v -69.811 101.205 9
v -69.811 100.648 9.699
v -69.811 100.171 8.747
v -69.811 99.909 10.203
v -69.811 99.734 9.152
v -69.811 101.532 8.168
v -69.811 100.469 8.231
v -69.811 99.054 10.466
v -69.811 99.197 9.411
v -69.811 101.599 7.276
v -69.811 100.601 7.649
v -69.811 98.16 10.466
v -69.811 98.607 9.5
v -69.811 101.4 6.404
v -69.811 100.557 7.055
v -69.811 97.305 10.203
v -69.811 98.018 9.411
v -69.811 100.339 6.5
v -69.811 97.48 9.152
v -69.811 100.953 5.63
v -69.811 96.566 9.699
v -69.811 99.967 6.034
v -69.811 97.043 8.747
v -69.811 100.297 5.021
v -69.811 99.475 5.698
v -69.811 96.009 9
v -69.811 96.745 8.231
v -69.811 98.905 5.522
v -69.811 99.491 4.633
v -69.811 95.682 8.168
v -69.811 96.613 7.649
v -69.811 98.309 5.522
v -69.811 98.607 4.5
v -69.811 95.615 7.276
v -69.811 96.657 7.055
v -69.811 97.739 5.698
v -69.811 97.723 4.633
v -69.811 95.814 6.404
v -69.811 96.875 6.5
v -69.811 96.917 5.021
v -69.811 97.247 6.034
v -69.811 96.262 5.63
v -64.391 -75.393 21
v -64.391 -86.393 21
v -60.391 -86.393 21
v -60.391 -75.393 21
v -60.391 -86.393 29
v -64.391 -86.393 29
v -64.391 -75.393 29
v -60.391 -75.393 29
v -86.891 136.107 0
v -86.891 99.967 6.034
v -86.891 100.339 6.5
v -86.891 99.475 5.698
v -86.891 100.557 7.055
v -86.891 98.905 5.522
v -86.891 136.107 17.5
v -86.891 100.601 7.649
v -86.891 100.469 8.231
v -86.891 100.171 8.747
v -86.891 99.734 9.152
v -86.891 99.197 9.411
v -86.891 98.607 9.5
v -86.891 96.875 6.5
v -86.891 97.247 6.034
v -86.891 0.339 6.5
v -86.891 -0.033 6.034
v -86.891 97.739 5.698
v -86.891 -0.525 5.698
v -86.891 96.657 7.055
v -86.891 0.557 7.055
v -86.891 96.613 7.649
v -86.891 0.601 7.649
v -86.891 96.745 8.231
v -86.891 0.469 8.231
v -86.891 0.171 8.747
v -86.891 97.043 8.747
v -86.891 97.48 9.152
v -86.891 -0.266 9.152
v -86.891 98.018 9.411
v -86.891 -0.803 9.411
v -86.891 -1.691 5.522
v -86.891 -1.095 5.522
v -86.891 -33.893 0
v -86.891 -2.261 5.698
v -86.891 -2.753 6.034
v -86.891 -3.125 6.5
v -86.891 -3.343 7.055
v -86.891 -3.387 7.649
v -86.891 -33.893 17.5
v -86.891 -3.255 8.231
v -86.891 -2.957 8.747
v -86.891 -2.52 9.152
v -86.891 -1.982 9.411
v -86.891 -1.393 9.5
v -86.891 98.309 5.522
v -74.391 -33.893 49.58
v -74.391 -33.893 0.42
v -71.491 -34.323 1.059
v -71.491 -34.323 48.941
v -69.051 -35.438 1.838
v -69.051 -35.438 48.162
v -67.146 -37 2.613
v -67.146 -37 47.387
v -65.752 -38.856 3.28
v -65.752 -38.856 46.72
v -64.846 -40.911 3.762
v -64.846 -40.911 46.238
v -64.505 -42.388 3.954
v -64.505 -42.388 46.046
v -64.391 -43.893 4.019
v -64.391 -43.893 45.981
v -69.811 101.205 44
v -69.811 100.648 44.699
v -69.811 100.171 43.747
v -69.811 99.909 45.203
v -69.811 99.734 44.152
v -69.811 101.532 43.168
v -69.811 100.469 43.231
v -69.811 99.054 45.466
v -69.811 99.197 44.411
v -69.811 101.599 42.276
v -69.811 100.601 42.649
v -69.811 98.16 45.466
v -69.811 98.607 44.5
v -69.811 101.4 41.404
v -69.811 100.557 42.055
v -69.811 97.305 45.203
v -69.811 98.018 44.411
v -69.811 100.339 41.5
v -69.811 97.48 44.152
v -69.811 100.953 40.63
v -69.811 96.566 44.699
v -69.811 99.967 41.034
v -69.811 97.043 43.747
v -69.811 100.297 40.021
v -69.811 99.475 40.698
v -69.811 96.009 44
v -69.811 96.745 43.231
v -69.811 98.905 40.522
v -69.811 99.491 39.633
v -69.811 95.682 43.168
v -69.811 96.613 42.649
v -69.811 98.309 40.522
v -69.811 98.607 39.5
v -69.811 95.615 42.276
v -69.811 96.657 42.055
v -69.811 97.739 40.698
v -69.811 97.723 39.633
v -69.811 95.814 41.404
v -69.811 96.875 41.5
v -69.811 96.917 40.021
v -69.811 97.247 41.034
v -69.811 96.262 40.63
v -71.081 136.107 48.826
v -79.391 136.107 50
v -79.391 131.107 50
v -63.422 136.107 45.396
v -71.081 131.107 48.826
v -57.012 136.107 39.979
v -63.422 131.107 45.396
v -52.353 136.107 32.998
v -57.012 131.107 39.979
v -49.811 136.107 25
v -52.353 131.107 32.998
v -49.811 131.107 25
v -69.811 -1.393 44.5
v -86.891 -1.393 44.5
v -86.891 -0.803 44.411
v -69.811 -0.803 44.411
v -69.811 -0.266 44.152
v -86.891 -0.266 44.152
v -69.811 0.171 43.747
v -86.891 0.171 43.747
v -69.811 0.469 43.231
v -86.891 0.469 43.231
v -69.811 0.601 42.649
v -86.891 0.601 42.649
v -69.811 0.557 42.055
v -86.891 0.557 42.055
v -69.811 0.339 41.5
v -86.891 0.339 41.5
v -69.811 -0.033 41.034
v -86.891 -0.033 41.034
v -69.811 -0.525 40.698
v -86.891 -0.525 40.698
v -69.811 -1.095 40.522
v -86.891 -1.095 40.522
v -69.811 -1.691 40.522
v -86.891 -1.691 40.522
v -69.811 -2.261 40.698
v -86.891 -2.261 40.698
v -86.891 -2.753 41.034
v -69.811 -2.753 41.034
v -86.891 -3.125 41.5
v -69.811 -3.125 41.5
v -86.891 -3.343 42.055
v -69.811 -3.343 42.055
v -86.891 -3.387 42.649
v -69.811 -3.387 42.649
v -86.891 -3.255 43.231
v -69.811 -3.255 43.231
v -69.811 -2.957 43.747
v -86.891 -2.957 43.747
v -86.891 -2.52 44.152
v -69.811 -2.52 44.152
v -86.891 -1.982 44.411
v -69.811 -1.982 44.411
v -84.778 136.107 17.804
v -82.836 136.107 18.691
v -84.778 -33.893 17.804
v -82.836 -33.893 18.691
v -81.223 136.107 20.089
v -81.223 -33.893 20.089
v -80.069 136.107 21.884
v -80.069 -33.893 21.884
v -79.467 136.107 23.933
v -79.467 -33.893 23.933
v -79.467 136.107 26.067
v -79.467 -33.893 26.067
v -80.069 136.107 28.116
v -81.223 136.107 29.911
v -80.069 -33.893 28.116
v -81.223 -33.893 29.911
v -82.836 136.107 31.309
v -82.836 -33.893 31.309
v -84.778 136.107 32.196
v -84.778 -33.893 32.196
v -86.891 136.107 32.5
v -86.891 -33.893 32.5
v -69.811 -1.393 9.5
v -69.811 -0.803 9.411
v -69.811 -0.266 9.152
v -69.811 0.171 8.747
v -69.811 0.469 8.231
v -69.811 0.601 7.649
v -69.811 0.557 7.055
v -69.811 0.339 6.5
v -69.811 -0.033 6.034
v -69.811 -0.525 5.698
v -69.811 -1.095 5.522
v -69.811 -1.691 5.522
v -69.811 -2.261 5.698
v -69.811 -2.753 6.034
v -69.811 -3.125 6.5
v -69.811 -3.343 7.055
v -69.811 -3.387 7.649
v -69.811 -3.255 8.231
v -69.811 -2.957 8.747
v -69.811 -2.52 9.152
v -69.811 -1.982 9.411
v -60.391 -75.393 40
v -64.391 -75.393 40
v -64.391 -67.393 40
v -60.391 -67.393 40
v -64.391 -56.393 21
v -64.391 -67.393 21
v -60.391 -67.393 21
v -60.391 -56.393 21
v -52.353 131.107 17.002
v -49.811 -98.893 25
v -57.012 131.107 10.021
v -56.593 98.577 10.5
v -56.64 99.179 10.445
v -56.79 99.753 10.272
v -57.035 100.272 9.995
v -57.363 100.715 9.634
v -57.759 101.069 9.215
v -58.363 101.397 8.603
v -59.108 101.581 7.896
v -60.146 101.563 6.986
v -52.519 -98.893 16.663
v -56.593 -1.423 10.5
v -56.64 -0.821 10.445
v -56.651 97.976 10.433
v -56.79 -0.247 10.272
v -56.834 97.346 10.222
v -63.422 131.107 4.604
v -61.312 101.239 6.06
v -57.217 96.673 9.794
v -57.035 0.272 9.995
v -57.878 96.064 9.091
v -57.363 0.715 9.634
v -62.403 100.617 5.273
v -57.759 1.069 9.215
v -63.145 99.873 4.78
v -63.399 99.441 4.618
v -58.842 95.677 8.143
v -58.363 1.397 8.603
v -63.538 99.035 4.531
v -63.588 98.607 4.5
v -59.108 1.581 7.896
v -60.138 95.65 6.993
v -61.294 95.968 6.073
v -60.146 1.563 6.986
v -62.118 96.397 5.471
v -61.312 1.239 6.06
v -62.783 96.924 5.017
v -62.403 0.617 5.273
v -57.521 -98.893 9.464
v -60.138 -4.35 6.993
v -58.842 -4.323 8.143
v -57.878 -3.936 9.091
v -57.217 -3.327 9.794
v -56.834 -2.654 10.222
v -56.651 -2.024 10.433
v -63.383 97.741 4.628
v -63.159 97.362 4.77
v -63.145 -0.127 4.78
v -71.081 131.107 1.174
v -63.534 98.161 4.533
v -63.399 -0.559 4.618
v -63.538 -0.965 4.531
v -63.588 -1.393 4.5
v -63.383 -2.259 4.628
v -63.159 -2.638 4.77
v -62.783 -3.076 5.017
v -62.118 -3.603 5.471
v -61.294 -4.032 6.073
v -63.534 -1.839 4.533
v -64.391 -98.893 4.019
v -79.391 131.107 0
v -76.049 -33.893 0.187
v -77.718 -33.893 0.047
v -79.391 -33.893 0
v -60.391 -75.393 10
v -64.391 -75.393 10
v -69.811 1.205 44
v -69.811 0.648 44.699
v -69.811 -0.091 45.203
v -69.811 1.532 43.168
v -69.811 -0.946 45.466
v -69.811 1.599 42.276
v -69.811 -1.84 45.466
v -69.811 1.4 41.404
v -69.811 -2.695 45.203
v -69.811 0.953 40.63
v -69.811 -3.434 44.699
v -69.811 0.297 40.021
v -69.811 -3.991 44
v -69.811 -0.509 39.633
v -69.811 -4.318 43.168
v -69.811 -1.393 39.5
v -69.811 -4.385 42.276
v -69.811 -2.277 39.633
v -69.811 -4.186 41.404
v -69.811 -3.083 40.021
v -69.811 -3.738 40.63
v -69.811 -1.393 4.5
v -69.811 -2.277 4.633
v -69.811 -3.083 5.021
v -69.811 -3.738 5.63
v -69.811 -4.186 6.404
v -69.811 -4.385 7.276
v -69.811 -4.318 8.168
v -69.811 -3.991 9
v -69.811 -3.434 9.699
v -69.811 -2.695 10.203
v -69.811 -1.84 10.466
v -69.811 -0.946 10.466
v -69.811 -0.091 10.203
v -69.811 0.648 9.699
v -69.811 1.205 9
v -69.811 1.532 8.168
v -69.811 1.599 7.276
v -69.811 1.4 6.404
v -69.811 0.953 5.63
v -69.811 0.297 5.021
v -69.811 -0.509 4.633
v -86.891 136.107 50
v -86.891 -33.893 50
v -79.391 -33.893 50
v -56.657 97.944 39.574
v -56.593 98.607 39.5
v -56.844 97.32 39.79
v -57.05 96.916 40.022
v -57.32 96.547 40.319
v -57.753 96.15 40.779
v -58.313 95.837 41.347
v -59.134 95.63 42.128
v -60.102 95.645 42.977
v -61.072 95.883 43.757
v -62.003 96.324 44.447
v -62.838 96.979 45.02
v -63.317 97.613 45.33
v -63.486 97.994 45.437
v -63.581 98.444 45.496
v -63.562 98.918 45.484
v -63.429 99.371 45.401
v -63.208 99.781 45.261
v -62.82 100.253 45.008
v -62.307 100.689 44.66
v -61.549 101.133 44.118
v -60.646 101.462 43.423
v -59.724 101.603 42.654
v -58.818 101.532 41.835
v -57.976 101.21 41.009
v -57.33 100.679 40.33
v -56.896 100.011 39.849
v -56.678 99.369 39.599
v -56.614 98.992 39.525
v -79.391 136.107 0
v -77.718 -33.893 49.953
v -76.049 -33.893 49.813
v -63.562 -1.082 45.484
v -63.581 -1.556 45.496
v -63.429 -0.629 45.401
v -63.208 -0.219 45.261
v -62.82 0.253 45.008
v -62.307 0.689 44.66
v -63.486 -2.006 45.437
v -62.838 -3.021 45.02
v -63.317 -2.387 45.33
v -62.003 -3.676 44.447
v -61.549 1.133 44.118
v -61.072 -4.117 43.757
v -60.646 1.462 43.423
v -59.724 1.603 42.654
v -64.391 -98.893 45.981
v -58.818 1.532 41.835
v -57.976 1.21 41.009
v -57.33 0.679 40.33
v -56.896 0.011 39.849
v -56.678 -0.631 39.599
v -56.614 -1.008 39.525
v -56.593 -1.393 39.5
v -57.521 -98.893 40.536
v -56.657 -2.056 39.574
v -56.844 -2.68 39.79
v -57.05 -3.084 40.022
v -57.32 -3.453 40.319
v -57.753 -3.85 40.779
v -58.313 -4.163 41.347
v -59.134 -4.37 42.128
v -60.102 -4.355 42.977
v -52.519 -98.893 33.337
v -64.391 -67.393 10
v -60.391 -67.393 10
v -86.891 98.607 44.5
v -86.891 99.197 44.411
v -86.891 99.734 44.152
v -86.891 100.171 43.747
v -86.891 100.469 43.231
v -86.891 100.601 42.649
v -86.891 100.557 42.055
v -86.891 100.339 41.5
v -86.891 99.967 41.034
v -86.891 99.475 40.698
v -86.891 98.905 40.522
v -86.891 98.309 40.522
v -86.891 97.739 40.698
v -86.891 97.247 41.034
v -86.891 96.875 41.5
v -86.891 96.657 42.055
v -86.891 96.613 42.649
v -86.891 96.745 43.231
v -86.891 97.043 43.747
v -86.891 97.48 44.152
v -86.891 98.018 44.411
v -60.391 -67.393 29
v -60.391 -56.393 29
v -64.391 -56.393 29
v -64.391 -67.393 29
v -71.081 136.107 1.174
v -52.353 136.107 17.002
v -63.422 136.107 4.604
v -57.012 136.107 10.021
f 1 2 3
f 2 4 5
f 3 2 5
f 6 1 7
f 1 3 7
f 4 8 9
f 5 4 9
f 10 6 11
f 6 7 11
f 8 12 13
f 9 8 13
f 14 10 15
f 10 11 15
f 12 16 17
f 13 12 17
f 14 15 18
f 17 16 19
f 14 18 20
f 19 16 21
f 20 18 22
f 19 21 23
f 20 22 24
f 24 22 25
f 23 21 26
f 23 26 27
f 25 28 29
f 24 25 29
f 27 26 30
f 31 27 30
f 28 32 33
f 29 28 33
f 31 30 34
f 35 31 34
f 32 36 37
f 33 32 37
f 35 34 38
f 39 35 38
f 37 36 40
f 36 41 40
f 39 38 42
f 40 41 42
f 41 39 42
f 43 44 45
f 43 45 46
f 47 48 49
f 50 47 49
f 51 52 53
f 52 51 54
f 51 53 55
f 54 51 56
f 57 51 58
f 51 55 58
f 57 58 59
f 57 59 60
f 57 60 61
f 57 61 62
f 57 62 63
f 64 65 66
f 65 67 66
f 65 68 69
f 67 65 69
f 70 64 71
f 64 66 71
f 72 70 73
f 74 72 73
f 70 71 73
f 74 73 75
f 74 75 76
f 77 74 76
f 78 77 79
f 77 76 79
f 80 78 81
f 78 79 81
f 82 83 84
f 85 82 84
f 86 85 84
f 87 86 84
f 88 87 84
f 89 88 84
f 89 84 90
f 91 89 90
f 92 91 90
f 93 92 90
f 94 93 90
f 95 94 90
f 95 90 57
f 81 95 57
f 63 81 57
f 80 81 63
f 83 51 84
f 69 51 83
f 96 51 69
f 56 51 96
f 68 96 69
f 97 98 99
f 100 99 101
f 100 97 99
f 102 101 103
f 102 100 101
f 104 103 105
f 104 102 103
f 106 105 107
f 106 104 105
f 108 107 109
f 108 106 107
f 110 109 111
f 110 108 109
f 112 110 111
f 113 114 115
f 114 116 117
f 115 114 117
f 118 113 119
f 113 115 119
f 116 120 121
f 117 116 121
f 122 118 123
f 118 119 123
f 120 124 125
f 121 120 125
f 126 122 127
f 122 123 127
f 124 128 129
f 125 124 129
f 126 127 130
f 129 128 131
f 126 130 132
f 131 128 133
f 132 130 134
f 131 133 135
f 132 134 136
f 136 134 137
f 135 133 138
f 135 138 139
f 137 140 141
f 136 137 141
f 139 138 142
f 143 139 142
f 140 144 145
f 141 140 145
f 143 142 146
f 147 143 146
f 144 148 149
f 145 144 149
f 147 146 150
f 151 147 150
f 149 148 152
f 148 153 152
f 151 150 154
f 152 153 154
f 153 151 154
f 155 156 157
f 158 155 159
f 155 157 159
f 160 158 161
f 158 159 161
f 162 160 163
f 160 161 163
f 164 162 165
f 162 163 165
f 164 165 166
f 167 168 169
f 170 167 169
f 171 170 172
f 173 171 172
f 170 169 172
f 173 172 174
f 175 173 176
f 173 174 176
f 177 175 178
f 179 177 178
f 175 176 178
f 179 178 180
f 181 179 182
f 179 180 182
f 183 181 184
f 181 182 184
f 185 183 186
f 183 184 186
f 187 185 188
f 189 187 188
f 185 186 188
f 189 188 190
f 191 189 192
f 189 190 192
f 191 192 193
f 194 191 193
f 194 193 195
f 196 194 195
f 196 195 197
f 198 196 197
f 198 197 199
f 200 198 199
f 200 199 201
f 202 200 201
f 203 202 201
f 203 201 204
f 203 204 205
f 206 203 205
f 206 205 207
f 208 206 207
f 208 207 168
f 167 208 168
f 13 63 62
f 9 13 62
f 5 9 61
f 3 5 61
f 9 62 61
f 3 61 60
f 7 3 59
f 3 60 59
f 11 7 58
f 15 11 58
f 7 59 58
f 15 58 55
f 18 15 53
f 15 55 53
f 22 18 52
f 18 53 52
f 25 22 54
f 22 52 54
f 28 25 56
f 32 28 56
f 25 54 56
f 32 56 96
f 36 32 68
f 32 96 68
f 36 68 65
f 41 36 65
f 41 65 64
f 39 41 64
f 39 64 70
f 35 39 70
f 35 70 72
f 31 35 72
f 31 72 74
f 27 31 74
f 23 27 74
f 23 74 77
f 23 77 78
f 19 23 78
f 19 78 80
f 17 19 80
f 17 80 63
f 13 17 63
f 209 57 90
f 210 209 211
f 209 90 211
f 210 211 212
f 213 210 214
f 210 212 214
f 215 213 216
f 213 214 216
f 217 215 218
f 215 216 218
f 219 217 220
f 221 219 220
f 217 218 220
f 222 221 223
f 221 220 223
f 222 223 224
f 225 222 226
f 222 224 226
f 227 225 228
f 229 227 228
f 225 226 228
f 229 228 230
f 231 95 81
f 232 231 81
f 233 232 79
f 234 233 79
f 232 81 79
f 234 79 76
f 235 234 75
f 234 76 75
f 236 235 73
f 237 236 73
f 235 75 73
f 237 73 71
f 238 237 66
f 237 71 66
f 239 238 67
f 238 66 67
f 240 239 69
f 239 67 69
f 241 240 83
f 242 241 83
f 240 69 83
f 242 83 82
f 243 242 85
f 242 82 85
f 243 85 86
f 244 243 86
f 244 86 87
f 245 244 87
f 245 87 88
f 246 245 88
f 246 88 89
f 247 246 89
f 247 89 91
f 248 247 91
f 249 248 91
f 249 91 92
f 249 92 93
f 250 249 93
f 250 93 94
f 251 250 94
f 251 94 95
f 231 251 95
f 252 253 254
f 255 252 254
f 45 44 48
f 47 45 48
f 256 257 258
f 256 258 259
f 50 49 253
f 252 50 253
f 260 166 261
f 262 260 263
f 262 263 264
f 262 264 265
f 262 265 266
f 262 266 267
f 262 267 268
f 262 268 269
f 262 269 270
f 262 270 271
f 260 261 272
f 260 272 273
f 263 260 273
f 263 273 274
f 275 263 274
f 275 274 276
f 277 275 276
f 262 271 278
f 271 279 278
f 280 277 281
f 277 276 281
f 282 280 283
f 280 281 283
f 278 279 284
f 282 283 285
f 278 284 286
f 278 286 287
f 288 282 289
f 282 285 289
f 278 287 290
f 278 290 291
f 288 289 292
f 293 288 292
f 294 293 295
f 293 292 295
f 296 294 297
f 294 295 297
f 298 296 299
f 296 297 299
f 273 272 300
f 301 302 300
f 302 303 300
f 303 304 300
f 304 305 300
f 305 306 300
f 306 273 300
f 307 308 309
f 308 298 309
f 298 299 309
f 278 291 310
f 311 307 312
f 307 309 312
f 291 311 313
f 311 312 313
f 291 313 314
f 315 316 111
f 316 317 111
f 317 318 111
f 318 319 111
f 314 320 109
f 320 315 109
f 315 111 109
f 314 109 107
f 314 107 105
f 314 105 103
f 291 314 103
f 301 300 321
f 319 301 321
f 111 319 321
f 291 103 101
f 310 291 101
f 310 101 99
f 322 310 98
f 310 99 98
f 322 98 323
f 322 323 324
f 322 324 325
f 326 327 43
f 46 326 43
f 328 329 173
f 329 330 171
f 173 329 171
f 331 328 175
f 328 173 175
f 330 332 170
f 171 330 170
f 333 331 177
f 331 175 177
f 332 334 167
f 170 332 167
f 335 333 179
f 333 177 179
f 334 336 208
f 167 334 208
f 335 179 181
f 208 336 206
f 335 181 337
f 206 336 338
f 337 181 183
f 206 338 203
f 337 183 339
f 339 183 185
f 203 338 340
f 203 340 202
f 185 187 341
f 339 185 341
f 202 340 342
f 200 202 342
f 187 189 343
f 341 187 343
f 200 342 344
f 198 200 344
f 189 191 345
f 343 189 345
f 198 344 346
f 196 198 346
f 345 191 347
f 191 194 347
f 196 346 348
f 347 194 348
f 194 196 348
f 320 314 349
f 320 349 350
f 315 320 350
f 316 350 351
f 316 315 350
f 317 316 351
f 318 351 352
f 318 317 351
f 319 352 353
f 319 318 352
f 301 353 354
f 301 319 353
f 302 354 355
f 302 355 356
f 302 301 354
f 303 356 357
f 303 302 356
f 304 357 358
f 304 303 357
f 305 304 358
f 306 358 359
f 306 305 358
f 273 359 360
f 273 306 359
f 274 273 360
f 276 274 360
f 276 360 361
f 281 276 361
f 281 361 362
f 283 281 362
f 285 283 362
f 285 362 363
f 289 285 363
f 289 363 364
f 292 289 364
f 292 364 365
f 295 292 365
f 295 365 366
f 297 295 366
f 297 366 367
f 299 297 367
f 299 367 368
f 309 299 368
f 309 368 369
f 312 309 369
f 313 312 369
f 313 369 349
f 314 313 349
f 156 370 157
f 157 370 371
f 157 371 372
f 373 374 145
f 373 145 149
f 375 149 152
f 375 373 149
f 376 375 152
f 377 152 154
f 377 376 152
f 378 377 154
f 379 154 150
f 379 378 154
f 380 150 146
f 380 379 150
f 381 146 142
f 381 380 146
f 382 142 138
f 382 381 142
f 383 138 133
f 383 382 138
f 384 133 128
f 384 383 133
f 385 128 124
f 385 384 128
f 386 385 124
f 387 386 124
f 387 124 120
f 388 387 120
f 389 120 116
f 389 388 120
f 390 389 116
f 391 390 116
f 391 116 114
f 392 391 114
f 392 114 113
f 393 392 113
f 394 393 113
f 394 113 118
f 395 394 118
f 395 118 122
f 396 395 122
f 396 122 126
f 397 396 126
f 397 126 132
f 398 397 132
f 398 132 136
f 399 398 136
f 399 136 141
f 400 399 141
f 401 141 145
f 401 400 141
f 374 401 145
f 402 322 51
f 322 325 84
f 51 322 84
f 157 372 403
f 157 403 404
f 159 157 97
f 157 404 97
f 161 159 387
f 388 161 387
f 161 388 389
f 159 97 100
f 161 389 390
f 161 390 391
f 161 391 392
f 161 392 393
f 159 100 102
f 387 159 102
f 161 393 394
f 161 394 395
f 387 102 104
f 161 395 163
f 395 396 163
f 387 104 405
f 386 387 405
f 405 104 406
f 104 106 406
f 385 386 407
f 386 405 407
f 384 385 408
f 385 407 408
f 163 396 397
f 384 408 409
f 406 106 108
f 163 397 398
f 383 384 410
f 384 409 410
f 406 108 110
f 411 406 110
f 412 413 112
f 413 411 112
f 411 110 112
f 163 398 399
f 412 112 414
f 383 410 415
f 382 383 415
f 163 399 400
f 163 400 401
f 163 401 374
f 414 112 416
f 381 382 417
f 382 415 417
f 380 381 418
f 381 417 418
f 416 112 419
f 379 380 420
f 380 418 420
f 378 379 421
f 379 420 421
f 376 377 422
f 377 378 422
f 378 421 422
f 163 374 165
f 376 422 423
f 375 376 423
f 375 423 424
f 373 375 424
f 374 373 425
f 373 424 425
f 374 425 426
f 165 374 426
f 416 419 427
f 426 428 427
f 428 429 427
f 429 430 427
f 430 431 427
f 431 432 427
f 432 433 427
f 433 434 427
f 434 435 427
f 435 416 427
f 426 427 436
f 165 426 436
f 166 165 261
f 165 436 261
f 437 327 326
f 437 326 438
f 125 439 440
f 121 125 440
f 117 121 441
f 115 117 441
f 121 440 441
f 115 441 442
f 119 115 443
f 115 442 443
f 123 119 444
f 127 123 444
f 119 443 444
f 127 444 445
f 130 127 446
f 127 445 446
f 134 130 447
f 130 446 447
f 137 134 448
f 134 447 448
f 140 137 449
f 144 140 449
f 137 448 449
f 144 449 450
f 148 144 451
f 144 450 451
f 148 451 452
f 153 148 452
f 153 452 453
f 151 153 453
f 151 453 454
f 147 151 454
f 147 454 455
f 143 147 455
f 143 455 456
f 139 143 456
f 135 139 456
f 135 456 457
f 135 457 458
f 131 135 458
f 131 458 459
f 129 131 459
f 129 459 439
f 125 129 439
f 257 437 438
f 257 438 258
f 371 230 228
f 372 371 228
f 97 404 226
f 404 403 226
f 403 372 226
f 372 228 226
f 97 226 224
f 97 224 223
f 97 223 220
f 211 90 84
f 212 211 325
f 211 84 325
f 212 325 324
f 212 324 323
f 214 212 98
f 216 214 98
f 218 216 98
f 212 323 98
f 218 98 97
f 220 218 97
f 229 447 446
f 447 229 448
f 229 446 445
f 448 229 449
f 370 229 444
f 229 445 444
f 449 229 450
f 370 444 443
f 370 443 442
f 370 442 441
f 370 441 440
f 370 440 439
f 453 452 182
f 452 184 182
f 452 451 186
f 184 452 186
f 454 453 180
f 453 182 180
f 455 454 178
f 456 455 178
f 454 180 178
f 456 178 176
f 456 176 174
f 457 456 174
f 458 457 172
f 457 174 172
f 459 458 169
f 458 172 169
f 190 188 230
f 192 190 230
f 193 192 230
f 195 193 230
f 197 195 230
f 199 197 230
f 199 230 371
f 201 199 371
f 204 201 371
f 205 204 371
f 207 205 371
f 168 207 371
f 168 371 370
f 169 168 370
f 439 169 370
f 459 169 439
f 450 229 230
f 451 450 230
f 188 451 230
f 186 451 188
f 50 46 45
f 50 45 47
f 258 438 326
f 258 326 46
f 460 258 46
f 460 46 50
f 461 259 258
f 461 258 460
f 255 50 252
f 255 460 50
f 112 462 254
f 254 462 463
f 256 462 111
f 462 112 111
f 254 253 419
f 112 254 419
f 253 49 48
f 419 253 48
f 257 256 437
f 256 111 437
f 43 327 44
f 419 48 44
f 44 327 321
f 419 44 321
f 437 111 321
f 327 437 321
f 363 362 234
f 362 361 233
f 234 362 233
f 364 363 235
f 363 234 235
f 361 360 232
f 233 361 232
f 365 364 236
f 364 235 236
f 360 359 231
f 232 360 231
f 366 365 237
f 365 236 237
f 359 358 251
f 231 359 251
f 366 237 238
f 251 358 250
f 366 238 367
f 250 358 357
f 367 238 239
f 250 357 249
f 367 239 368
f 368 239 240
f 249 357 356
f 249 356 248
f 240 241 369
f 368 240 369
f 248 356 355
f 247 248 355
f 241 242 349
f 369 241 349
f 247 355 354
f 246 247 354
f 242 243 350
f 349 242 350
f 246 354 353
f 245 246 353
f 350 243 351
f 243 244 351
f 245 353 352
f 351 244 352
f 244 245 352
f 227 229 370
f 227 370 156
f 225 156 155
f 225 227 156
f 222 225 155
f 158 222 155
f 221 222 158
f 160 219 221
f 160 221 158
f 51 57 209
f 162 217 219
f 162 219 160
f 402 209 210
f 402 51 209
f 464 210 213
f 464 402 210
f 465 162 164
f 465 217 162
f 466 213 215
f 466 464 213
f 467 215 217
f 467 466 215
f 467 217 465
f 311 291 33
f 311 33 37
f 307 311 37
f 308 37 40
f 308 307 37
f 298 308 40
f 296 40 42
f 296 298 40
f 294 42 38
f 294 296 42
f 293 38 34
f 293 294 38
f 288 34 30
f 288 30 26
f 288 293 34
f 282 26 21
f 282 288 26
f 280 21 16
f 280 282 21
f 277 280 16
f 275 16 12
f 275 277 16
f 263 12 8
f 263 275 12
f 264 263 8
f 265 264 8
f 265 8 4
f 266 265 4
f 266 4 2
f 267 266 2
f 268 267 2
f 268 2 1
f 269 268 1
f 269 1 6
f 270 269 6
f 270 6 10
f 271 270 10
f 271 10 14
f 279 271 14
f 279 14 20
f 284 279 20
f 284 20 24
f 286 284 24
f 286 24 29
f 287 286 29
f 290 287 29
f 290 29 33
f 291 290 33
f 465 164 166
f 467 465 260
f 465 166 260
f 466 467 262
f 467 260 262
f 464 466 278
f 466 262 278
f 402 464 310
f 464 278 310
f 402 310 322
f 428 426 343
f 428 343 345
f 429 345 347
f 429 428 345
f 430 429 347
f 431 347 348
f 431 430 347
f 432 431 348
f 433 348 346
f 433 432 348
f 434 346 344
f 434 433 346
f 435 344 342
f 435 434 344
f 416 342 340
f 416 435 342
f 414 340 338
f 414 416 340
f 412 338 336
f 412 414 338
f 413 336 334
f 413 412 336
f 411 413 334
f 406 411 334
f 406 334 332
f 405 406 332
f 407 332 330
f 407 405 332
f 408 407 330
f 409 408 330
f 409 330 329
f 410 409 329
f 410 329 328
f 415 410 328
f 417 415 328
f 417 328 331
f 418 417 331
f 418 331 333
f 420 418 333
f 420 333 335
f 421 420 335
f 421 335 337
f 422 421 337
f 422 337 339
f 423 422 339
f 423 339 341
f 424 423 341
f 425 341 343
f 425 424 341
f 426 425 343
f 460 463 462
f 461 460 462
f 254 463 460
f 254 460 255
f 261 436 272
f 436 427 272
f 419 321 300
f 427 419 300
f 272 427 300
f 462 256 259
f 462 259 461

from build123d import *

# Parameters (mm, degrees)
BOSS_EXTRU_1_DEPTH            = 50
CONG_4_R                      = 35
CONG_5_R                      = 35
CONG_6_R                      = 30
CONG_12_R                     = 10
ENL_V_MAT_EXTRU_8_DEPTH       = 251
ESQUISSE6_R                   = 2
ENL_V_MAT_EXTRU_9_DEPTH       = 58
ENL_V_MAT_EXTRU_12_DEPTH      = 251.898527225
ENL_V_MAT_EXTRU_12_DEPTH_BACK = 179
ESQUISSE11_R                  = 3
ENL_V_MAT_EXTRU_14_DEPTH      = 20
BOSS_EXTRU_2_DEPTH            = 5
ESQUISSE13_W                  = 8
ESQUISSE13_H                  = 30
ESQUISSE13_W_2                = 30
ESQUISSE13_H_2                = 8
ENL_V_MAT_EXTRU_15_DEPTH      = 4


with BuildPart() as part:
    # Esquisse1 → Boss.-Extru.1 (new body)
    with BuildSketch(Plane.XY):
        Polygon((-129.391143911, 131.10701107), (-129.391143911, -98.89298893), (-124.391143911, -98.89298893), (-124.391143911, -33.89298893), (-64.391143911, -33.89298893), (-64.391143911, -98.89298893), (-49.391143911, -98.89298893), (-49.391143911, 131.10701107), align=None)
    extrude(amount=BOSS_EXTRU_1_DEPTH)

    # Congé4
    cong_4_edges = [part.edges().sort_by_distance(p)[0] for p in [
        (-129.391143911, 16.10701107, 50),
    ]]
    fillet(cong_4_edges, radius=CONG_4_R)

    # Congé5
    # the kernel refuses this fillet: 35 mm, written as the material it takes off along each edge
    with BuildSketch(Plane(origin=(-129.391143911, 202.914044152, 0), x_dir=(0, 0, 1), z_dir=(0, -1, 0))) as cong_5_piece_1:
        with BuildLine():
            CenterArc((35, -28.722813233), CONG_5_R, 124.849904579, 55.150095421)
            Line((0, -28.722813233), (-0.7, -28.722813233))
            Line((-0.7, -28.722813233), (-0.7, 0))
            Line((-0.7, 0), (0, 0.7))
            ThreePointArc((0, 0.7), (7.5, 0.7), (14.6, 0.574456265))
            Line((14.6, 0.574456265), (15, 0))
        make_face()
    extrude(amount=373.614066163, mode=Mode.SUBTRACT)

    # Congé6
    # the kernel refuses this fillet: 30 mm, written as the material it takes off along each edge
    with BuildSketch(Plane(origin=(-49.391143911, -173.89298893, 0), x_dir=(-1, 0, 0), z_dir=(0, 1, 0))) as cong_6_piece_1:
        with BuildLine():
            CenterArc((CONG_6_R, CONG_6_R), CONG_6_R, 180, 90)
            Line((0, CONG_6_R), (0, 0))
            Line((0, 0), (CONG_6_R, 0))
        make_face()
    extrude(amount=380, mode=Mode.SUBTRACT)
    with BuildSketch(Plane(origin=(-49.391143911, -173.89298893, 50), x_dir=(-1, 0, 0), z_dir=(0, 1, 0))) as cong_6_piece_2:
        with BuildLine():
            CenterArc((CONG_6_R, -CONG_6_R), CONG_6_R, 90, 90)
            Line((0, -CONG_6_R), (0, 0))
            Line((0, 0), (CONG_6_R, 0))
        make_face()
    extrude(amount=380, mode=Mode.SUBTRACT)

    # Congé12
    cong_12_edges = [part.edges().sort_by_distance(p)[0] for p in [
        (-124.391143911, -33.89298893, 21.146981396),
        (-64.391143911, -33.89298893, 25),
    ]]
    fillet(cong_12_edges, radius=CONG_12_R)

    # Esquisse5 → Enlèv. mat.-Extru.8 (cut)
    with BuildSketch(Plane(origin=(0, 131.10701107, 0), x_dir=(1, 0, 0), z_dir=(0, 1, 0))):
        with BuildLine():
            Line((-86.891143911, -50), (-86.891143911, 0))
            ThreePointArc((-86.891143911, 0), (-162.141280076, -25), (-86.891143911, -50))
        make_face()
    extrude(amount=-ENL_V_MAT_EXTRU_8_DEPTH, mode=Mode.SUBTRACT)

    # Esquisse6 → Enlèv. mat.-Extru.9 (cut)
    with BuildSketch(Plane.ZY.offset(86.891143911)):
        with Locations((7.5, 98.60701107)):
            Circle(ESQUISSE6_R)
        with Locations((42.5, 98.60701107)):
            Circle(ESQUISSE6_R)
        with Locations((42.5, -1.39298893)):
            Circle(ESQUISSE6_R)
        with Locations((7.5, -1.39298893)):
            Circle(ESQUISSE6_R)
    extrude(amount=-ENL_V_MAT_EXTRU_9_DEPTH, mode=Mode.SUBTRACT)

    # Esquisse9 → Enlèv. mat.-Extru.12 (cut, two sides: drawn at the far end of the back side and taken through both)
    with BuildSketch(Plane(origin=(0, 131.10701107, 0), x_dir=(1, 0, 0), z_dir=(0, 1, 0)).offset(-ENL_V_MAT_EXTRU_12_DEPTH_BACK)):
        with BuildLine():
            Line((-195.505666121, -17.5), (-86.891143911, -17.5))
            ThreePointArc((-86.891143911, -17.5), (-79.391143911, -25), (-86.891143911, -32.5))
            Line((-86.891143911, -32.5), (-195.505666121, -32.5))
            Line((-195.505666121, -32.5), (-412.73471054, -32.5))
            Line((-412.73471054, -32.5), (-412.73471054, -17.5))
            Line((-412.73471054, -17.5), (-195.505666121, -17.5))
        make_face()
    extrude(amount=ENL_V_MAT_EXTRU_12_DEPTH + ENL_V_MAT_EXTRU_12_DEPTH_BACK, mode=Mode.SUBTRACT)

    # Esquisse11 → Enlèv. mat.-Extru.14 (cut)
    with BuildSketch(Plane.ZY.offset(49.810744996)):
        with Locations(Location((42.5, 98.60701107, 0), (0, 0, 180))):
            Circle(ESQUISSE11_R)
        with Locations(Location((7.5, 98.60701107, 0), (0, 0, 180))):
            Circle(ESQUISSE11_R)
        with Locations(Location((42.5, -1.39298893, 0), (0, 0, 180))):
            Circle(ESQUISSE11_R)
        with Locations(Location((7.5, -1.39298893, 0), (0, 0, 180))):
            Circle(ESQUISSE11_R)
    extrude(amount=ENL_V_MAT_EXTRU_14_DEPTH, mode=Mode.SUBTRACT)

    # Esquisse12 → Boss.-Extru.2 (add)
    with BuildSketch(Plane(origin=(0, 131.10701107, 0), x_dir=(1, 0, 0), z_dir=(0, 1, 0))):
        with BuildLine():
            Line((-79.391143911, 0), (-86.891143911, 0))
            Line((-86.891143911, 0), (-86.891143911, -17.5))
            ThreePointArc((-86.891143911, -17.5), (-79.391143911, -25), (-86.891143911, -32.5))
            Line((-86.891143911, -32.5), (-86.891143911, -50))
            Line((-86.891143911, -50), (-79.391143911, -50))
            ThreePointArc((-79.391143911, -50), (-60.02622718, -42.912878475), (-49.810744996, -25))
            ThreePointArc((-49.810744996, -25), (-60.02622718, -7.087121525), (-79.391143911, 0))
        make_face()
    extrude(amount=BOSS_EXTRU_2_DEPTH)

    # Esquisse13 → Enlèv. mat.-Extru.15 (cut)
    with BuildSketch(Plane.ZY.offset(64.391143911)):
        with Locations((25, -71.39298893)):
            Rectangle(ESQUISSE13_W, ESQUISSE13_H)
        with Locations((25, -71.39298893)):
            Rectangle(ESQUISSE13_W_2, ESQUISSE13_H_2)
    extrude(amount=-ENL_V_MAT_EXTRU_15_DEPTH, mode=Mode.SUBTRACT)


solid = part.part
